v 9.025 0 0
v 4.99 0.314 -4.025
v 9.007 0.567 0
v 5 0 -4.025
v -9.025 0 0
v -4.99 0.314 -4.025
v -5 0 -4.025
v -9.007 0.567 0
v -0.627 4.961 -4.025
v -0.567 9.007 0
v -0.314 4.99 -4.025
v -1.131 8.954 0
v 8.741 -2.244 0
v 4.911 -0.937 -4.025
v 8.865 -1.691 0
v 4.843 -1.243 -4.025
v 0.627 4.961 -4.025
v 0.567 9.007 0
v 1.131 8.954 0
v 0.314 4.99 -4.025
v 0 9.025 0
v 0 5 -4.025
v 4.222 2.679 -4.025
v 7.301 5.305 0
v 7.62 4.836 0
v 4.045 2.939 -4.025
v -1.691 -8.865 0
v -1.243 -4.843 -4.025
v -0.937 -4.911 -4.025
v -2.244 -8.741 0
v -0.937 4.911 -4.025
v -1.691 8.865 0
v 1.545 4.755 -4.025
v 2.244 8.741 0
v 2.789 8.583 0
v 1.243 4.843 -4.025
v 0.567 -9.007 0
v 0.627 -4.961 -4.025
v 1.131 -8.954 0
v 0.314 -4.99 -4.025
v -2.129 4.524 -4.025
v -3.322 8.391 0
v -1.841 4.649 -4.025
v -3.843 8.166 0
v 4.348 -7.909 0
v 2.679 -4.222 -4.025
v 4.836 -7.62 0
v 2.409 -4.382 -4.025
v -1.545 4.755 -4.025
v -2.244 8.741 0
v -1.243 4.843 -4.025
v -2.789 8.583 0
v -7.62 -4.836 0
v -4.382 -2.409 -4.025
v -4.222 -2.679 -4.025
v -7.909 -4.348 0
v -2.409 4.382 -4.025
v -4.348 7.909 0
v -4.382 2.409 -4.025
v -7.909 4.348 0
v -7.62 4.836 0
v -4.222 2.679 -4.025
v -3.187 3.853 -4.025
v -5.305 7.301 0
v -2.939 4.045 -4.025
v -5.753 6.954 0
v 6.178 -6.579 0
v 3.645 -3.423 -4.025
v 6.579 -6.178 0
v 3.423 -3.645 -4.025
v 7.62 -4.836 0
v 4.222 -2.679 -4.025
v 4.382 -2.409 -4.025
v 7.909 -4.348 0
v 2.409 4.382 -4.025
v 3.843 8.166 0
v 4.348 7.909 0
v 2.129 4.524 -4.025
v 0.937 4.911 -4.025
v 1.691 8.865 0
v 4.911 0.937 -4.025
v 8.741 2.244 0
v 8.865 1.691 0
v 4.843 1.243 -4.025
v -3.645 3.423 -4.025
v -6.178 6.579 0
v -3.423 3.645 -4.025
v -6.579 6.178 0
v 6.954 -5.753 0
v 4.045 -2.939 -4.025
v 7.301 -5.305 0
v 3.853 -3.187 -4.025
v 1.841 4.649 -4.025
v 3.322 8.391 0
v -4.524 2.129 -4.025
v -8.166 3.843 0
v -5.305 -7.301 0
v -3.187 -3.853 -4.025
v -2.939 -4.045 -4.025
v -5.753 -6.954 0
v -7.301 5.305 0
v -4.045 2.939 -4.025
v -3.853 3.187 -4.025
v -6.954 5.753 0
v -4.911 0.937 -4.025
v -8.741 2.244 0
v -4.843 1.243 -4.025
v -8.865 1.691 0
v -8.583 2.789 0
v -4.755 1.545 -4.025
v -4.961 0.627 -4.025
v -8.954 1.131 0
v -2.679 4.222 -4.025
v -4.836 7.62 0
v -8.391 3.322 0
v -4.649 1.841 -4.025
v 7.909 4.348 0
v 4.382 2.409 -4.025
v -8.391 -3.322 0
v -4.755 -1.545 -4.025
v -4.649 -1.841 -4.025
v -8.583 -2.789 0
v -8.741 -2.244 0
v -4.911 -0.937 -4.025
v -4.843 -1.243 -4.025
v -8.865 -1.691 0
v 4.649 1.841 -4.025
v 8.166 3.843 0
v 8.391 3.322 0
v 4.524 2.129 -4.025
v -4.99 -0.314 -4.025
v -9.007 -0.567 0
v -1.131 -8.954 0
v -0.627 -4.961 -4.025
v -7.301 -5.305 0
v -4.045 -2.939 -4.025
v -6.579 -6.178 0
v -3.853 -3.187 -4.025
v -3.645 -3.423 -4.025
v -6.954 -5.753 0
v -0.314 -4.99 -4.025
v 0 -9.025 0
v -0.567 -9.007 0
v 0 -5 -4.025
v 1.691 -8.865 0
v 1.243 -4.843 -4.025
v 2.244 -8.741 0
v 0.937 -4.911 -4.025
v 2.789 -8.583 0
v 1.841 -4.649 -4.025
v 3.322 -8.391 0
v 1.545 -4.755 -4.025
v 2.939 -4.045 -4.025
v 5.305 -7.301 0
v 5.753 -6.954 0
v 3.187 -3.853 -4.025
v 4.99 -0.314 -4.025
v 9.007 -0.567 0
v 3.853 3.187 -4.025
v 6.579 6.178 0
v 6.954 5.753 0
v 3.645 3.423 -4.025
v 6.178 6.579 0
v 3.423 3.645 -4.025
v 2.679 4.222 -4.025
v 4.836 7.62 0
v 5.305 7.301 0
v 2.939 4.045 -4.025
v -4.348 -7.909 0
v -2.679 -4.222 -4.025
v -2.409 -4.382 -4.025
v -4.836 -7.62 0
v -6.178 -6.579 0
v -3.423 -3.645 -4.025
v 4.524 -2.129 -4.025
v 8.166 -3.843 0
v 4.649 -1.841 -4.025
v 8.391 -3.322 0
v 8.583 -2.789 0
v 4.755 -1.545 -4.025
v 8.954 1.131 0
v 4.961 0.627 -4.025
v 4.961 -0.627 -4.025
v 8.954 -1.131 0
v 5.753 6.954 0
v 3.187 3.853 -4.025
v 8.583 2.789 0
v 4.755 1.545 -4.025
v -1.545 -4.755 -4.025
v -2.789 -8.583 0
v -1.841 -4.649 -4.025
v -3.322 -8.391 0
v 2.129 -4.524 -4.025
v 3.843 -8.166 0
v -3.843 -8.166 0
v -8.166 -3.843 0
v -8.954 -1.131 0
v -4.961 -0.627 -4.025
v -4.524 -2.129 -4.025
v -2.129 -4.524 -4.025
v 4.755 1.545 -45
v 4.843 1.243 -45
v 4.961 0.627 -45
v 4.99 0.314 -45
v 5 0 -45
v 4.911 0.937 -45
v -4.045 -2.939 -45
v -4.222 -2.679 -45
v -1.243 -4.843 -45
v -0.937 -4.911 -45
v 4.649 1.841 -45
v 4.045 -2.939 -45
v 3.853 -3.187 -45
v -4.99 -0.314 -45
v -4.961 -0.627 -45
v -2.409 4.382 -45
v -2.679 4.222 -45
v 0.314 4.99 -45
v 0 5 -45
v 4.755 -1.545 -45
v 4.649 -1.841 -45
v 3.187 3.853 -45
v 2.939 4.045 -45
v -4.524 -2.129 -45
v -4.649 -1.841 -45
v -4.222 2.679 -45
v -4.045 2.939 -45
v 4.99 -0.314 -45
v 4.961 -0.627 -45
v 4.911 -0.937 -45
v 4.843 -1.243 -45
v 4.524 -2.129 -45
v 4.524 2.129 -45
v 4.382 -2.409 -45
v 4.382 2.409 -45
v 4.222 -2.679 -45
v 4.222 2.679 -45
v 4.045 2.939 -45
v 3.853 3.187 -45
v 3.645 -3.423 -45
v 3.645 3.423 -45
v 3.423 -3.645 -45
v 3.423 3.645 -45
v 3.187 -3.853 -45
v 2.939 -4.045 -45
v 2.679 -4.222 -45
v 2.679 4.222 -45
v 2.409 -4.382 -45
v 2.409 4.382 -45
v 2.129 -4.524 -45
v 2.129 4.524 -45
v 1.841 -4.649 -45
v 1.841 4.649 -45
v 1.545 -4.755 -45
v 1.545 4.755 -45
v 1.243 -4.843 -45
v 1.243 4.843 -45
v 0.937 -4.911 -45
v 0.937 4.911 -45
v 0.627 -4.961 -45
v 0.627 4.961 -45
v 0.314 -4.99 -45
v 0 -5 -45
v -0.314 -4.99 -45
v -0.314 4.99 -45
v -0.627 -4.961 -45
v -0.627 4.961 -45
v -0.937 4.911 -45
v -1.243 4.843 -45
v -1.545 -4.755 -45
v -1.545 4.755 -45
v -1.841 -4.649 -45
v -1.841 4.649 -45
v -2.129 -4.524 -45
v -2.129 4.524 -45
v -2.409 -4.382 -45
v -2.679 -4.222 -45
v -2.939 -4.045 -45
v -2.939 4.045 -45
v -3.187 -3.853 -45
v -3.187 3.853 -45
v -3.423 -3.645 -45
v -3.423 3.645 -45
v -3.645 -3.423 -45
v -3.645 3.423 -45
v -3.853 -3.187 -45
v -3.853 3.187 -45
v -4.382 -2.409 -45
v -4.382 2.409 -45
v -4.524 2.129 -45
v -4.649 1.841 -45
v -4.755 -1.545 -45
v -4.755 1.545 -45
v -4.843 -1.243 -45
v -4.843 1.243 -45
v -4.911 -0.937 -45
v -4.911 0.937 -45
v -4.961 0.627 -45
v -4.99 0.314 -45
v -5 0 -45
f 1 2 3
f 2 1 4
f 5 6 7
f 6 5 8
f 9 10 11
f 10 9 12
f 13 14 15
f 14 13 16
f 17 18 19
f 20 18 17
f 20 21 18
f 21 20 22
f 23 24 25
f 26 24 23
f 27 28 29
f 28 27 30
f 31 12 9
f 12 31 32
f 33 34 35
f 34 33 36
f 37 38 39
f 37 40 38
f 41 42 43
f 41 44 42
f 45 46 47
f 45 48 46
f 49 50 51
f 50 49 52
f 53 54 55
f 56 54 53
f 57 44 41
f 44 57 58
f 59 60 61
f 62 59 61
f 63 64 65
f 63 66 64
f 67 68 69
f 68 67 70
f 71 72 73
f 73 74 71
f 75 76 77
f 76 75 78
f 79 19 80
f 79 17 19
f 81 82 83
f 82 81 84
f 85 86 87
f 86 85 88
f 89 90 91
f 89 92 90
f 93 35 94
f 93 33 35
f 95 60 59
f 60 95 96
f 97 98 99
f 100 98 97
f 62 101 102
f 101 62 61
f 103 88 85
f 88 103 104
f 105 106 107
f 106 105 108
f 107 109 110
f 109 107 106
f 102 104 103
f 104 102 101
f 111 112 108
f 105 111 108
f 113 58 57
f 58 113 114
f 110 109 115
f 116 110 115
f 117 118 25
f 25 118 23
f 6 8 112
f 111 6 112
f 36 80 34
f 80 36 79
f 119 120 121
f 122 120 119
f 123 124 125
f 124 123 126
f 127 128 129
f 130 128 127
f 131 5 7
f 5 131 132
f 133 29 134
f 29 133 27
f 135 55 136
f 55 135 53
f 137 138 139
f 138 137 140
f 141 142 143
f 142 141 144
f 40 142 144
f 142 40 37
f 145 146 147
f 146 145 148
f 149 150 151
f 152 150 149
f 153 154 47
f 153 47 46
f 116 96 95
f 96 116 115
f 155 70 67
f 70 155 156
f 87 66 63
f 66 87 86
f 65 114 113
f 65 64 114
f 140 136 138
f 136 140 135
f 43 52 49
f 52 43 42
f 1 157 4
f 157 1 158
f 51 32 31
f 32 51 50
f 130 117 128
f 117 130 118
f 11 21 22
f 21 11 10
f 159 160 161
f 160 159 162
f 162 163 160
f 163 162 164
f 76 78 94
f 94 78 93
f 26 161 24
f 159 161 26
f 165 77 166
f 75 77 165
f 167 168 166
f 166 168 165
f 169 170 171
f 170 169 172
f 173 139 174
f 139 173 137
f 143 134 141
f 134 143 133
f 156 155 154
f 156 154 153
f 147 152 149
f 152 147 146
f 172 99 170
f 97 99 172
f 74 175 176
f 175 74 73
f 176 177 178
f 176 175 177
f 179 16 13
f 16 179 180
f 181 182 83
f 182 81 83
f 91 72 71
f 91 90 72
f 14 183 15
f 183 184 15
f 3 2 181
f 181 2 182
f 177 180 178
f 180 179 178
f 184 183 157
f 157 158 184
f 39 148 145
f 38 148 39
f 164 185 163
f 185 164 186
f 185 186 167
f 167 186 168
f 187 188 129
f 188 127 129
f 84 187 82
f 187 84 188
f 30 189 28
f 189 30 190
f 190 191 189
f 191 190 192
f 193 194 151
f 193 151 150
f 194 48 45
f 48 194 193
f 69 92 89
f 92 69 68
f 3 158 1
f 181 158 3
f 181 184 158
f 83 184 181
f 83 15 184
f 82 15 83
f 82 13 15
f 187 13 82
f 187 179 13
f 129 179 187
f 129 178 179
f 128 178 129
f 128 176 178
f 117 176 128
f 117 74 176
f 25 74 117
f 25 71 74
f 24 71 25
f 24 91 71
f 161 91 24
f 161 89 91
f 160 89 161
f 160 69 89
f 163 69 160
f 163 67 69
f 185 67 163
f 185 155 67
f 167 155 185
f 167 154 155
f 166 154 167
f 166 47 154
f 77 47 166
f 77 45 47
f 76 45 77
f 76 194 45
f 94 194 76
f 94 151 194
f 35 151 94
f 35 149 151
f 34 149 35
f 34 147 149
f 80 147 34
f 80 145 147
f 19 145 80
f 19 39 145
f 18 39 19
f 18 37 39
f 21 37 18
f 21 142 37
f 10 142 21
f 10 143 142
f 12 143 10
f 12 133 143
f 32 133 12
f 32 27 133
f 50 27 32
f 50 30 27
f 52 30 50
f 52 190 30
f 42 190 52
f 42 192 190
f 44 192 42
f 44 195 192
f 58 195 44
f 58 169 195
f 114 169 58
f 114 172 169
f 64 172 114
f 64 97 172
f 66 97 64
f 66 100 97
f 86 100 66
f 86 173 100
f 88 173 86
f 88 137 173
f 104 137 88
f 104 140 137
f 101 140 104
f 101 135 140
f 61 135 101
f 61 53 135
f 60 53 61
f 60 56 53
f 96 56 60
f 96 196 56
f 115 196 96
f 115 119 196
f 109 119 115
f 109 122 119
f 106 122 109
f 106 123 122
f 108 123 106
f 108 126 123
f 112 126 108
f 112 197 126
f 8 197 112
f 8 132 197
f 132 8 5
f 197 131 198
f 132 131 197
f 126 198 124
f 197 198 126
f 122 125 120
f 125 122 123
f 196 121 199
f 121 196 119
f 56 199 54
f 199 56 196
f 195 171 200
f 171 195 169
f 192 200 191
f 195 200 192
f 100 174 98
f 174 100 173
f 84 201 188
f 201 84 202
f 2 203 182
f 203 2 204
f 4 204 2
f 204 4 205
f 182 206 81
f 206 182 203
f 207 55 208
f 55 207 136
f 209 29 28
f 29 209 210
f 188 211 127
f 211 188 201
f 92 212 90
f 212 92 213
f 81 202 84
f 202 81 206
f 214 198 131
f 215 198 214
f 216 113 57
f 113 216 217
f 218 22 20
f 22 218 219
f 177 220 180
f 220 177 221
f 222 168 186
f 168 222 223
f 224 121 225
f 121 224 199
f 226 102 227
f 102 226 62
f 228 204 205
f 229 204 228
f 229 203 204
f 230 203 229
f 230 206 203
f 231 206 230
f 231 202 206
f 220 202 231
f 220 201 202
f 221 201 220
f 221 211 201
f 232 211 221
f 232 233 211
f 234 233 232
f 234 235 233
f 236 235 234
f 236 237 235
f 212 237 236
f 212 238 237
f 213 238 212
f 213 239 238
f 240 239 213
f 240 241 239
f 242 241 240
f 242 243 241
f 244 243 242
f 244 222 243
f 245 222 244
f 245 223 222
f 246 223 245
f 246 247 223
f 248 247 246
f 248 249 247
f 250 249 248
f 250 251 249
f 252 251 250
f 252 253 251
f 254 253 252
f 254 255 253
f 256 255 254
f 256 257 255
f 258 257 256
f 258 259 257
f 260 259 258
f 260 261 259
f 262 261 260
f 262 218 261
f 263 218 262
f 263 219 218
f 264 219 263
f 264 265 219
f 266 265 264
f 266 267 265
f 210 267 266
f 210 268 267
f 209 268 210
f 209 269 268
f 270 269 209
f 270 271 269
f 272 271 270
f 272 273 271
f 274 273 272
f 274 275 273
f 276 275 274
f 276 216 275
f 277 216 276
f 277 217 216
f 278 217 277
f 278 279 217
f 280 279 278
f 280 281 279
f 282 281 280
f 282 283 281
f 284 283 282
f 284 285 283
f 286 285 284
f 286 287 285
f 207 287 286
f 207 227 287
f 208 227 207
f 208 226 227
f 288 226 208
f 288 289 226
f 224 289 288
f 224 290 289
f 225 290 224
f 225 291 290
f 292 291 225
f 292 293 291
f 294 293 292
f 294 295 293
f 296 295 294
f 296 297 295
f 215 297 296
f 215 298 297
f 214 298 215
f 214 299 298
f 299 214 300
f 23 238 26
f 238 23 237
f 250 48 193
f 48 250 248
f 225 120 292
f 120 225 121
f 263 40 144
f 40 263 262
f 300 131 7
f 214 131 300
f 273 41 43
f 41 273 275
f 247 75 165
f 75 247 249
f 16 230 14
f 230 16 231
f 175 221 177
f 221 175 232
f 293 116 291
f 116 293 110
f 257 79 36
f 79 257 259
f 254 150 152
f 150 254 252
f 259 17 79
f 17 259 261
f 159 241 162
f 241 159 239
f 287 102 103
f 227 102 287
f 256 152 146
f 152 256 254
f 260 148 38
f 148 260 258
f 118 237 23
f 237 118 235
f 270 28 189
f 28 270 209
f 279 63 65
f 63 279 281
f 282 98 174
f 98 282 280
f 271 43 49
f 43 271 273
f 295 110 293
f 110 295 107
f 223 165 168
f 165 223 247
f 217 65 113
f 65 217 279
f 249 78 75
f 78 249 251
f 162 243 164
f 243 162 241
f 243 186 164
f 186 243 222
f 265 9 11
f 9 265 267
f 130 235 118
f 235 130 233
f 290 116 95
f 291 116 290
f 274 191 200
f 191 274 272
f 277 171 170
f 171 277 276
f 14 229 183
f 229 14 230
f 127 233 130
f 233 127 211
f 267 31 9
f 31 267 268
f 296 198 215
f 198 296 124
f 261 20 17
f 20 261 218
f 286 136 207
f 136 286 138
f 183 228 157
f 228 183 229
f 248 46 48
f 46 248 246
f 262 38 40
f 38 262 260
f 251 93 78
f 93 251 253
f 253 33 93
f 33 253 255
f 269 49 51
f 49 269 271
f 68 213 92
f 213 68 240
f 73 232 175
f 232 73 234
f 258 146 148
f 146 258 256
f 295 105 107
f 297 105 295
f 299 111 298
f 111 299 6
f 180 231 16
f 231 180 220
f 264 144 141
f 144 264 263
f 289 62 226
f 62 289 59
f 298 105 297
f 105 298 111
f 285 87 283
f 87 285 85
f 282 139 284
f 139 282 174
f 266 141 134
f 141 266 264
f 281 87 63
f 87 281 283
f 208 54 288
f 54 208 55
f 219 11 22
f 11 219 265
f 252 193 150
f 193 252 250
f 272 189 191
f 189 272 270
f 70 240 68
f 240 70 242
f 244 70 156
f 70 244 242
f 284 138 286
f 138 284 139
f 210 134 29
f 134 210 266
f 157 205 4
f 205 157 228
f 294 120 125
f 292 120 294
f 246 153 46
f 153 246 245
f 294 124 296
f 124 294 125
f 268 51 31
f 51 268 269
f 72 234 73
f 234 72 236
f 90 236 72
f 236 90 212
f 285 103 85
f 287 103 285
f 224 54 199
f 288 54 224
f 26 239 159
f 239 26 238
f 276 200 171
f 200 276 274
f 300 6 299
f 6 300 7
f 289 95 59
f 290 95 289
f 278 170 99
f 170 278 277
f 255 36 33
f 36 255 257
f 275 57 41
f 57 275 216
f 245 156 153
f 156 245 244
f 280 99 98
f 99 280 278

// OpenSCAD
$fn=100;

// M10
crew_head_diameter=(18.3+17.8)/2; // dk
crew_body_diameter=10;

screw_length=45;

// Head
translate([0, 0, -crew_head_diameter/2])
cylinder(h=crew_head_diameter/2,r1=0, r2=crew_head_diameter/2, center=false);

// Body
translate([0, 0, -screw_length])
cylinder(h=screw_length, d=crew_body_diameter, center=false);
